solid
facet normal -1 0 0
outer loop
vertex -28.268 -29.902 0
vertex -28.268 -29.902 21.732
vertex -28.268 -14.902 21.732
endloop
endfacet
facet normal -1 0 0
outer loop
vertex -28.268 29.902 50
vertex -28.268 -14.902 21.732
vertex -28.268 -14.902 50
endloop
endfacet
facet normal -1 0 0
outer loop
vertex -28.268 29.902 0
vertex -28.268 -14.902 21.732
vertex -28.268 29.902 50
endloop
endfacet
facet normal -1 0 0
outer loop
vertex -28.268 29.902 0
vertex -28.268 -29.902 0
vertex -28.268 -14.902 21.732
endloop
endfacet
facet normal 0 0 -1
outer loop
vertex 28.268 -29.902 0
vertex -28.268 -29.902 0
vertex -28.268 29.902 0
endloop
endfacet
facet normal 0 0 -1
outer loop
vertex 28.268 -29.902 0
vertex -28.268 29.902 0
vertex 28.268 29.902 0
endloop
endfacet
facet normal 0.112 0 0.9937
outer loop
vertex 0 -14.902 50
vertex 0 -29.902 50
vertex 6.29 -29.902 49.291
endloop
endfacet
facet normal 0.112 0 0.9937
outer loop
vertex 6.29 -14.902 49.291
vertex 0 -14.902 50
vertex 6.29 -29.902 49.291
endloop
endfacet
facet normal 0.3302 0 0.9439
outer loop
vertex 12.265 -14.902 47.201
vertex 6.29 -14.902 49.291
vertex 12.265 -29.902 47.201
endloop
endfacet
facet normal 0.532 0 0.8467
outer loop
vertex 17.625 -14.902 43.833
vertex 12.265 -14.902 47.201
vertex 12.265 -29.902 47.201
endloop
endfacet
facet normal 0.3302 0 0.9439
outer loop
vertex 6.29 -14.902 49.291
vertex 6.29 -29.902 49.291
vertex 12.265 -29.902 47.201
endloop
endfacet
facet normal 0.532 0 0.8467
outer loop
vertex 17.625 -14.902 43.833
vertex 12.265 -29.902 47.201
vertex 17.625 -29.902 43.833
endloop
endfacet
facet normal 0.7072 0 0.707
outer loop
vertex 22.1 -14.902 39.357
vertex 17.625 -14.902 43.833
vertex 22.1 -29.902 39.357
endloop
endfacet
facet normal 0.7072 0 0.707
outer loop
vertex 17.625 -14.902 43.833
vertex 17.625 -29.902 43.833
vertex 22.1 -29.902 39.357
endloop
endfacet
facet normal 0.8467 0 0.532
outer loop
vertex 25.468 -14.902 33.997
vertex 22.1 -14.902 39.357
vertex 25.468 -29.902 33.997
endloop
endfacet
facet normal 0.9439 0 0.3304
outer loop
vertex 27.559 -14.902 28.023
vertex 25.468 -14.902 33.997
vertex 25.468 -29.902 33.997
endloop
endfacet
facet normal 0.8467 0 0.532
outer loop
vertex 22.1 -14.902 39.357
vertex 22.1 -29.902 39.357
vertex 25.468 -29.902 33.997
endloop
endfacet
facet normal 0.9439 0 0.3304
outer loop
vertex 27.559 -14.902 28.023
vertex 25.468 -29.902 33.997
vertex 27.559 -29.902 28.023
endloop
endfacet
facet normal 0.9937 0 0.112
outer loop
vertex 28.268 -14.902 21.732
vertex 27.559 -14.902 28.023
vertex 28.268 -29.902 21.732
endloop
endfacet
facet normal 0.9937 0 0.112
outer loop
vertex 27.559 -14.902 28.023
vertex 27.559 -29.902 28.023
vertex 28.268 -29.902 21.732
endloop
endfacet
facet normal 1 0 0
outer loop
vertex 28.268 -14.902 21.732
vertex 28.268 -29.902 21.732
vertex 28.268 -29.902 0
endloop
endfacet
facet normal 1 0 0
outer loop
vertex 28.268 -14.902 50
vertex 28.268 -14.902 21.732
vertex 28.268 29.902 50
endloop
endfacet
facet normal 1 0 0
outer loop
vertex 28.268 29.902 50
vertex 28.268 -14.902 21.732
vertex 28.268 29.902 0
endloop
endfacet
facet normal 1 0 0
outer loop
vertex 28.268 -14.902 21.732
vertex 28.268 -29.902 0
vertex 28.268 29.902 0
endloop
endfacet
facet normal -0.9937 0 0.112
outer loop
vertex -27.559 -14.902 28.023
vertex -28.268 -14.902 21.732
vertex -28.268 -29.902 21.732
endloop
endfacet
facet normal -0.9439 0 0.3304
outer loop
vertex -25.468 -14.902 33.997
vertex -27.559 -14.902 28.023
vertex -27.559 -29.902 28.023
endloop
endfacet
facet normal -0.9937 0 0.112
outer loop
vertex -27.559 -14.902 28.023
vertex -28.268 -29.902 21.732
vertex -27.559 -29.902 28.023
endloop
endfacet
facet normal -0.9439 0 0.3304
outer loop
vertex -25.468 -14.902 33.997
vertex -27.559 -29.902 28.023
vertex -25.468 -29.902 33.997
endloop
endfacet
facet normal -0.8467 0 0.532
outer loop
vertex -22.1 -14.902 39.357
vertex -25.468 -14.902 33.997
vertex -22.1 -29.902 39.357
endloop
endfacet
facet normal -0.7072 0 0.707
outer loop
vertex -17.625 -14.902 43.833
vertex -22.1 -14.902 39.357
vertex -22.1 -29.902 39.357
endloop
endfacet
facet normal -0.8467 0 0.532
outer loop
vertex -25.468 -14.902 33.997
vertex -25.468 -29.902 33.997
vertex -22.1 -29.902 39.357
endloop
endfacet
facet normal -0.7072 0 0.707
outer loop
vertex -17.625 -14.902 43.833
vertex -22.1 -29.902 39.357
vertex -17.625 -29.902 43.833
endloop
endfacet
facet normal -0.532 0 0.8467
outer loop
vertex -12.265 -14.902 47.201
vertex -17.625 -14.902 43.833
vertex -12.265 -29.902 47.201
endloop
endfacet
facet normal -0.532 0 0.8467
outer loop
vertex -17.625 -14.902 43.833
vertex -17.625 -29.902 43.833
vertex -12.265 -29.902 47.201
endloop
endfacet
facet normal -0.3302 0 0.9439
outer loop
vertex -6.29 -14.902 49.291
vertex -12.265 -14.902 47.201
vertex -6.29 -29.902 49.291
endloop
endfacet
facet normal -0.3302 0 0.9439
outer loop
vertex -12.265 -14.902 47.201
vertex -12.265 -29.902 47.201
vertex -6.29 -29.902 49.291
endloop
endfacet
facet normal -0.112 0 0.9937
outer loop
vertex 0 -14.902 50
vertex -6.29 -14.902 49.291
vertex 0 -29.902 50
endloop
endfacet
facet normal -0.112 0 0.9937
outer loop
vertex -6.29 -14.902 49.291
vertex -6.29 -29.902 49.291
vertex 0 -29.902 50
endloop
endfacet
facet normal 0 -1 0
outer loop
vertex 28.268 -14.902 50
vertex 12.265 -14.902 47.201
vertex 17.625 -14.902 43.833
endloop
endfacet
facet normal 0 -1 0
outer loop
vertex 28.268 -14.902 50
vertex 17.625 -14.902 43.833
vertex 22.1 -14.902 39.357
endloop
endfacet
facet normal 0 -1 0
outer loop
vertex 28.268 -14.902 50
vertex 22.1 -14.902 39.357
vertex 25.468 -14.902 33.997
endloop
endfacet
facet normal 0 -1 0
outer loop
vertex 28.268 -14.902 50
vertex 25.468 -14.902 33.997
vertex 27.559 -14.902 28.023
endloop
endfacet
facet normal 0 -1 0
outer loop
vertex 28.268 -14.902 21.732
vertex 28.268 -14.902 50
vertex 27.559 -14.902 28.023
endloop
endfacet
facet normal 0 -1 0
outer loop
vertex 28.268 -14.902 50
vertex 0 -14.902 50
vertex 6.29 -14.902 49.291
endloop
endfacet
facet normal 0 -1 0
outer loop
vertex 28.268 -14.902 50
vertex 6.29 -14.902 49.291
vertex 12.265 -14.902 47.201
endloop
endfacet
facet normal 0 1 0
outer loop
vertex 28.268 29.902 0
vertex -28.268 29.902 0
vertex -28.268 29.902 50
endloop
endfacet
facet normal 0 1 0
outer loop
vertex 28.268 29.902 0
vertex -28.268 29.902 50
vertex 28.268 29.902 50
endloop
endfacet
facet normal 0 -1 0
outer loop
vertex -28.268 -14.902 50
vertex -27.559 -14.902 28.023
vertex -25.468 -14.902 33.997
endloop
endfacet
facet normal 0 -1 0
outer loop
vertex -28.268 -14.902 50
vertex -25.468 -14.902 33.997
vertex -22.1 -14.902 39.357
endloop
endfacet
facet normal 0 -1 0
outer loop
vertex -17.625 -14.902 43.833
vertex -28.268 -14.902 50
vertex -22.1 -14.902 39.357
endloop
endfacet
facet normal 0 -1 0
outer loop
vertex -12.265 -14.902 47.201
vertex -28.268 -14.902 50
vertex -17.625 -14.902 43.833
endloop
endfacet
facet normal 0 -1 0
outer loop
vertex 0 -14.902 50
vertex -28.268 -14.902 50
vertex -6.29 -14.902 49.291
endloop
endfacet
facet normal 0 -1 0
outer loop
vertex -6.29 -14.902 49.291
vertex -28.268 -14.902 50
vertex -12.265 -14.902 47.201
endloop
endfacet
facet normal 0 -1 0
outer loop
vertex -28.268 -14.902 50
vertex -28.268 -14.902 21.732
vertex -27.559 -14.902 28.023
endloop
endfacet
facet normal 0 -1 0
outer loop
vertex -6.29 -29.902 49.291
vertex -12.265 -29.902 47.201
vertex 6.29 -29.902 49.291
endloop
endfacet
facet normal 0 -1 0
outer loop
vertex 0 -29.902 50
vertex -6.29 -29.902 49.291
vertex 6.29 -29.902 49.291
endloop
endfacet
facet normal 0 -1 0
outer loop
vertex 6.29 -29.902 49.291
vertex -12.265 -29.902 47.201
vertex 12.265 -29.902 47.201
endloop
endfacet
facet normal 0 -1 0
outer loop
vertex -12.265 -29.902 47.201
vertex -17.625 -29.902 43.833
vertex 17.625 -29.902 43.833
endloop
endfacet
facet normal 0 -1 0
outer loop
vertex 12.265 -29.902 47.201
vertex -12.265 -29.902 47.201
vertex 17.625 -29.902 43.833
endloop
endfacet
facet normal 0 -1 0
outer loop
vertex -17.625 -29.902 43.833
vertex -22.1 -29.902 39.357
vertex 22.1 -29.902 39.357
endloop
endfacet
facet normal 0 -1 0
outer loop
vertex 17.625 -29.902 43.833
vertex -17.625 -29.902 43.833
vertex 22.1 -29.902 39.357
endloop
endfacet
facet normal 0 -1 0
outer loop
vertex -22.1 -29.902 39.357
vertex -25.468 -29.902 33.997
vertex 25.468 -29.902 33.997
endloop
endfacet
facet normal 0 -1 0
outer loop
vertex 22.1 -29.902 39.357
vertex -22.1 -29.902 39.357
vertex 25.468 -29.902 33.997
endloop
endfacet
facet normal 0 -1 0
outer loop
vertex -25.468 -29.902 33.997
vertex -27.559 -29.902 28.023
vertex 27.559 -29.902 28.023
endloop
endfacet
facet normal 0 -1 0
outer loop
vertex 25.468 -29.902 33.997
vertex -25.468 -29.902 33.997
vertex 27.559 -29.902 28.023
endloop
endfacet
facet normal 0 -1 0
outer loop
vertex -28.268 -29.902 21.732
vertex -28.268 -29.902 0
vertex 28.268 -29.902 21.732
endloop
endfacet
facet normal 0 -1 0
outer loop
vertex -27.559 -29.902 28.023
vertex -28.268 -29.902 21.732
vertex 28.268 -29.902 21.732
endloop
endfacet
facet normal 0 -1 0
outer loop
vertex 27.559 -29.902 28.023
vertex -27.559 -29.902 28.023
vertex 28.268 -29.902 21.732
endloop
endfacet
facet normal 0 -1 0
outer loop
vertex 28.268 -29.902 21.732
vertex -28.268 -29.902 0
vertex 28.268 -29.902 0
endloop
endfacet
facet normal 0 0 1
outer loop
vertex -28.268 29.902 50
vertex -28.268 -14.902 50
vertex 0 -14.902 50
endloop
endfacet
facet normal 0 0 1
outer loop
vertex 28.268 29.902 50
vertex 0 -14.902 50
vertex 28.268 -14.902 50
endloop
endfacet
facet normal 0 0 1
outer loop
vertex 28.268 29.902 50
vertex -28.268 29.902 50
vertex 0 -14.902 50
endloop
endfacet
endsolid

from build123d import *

# Parameters (mm, degrees)
F0_W     = 56.53508
F0_H     = 59.804362
F1_DEPTH = 50
F3_DEPTH = 15


with BuildPart() as f1:
    # F0 (on Top) → F1 (new body)
    with BuildSketch(Plane.XY):
        Rectangle(F0_W, F0_H)
    extrude(amount=F1_DEPTH)

    # F2 (on face) → F3 (cut)
    with BuildSketch(Plane.XZ.offset(29.902181)):
        with BuildLine():
            ThreePointArc((0, 50), (19.988169, 41.720629), (28.26754, 21.73246))
            Line((28.26754, 21.73246), (28.26754, 50))
            Line((28.26754, 50), (0, 50))
        make_face()
        with BuildLine():
            ThreePointArc((-28.26754, 21.73246), (-19.988169, 41.720629), (0, 50))
            Line((0, 50), (-28.26754, 50))
            Line((-28.26754, 50), (-28.26754, 21.73246))
        make_face()
    extrude(amount=-F3_DEPTH, mode=Mode.SUBTRACT)


solid = f1.part
